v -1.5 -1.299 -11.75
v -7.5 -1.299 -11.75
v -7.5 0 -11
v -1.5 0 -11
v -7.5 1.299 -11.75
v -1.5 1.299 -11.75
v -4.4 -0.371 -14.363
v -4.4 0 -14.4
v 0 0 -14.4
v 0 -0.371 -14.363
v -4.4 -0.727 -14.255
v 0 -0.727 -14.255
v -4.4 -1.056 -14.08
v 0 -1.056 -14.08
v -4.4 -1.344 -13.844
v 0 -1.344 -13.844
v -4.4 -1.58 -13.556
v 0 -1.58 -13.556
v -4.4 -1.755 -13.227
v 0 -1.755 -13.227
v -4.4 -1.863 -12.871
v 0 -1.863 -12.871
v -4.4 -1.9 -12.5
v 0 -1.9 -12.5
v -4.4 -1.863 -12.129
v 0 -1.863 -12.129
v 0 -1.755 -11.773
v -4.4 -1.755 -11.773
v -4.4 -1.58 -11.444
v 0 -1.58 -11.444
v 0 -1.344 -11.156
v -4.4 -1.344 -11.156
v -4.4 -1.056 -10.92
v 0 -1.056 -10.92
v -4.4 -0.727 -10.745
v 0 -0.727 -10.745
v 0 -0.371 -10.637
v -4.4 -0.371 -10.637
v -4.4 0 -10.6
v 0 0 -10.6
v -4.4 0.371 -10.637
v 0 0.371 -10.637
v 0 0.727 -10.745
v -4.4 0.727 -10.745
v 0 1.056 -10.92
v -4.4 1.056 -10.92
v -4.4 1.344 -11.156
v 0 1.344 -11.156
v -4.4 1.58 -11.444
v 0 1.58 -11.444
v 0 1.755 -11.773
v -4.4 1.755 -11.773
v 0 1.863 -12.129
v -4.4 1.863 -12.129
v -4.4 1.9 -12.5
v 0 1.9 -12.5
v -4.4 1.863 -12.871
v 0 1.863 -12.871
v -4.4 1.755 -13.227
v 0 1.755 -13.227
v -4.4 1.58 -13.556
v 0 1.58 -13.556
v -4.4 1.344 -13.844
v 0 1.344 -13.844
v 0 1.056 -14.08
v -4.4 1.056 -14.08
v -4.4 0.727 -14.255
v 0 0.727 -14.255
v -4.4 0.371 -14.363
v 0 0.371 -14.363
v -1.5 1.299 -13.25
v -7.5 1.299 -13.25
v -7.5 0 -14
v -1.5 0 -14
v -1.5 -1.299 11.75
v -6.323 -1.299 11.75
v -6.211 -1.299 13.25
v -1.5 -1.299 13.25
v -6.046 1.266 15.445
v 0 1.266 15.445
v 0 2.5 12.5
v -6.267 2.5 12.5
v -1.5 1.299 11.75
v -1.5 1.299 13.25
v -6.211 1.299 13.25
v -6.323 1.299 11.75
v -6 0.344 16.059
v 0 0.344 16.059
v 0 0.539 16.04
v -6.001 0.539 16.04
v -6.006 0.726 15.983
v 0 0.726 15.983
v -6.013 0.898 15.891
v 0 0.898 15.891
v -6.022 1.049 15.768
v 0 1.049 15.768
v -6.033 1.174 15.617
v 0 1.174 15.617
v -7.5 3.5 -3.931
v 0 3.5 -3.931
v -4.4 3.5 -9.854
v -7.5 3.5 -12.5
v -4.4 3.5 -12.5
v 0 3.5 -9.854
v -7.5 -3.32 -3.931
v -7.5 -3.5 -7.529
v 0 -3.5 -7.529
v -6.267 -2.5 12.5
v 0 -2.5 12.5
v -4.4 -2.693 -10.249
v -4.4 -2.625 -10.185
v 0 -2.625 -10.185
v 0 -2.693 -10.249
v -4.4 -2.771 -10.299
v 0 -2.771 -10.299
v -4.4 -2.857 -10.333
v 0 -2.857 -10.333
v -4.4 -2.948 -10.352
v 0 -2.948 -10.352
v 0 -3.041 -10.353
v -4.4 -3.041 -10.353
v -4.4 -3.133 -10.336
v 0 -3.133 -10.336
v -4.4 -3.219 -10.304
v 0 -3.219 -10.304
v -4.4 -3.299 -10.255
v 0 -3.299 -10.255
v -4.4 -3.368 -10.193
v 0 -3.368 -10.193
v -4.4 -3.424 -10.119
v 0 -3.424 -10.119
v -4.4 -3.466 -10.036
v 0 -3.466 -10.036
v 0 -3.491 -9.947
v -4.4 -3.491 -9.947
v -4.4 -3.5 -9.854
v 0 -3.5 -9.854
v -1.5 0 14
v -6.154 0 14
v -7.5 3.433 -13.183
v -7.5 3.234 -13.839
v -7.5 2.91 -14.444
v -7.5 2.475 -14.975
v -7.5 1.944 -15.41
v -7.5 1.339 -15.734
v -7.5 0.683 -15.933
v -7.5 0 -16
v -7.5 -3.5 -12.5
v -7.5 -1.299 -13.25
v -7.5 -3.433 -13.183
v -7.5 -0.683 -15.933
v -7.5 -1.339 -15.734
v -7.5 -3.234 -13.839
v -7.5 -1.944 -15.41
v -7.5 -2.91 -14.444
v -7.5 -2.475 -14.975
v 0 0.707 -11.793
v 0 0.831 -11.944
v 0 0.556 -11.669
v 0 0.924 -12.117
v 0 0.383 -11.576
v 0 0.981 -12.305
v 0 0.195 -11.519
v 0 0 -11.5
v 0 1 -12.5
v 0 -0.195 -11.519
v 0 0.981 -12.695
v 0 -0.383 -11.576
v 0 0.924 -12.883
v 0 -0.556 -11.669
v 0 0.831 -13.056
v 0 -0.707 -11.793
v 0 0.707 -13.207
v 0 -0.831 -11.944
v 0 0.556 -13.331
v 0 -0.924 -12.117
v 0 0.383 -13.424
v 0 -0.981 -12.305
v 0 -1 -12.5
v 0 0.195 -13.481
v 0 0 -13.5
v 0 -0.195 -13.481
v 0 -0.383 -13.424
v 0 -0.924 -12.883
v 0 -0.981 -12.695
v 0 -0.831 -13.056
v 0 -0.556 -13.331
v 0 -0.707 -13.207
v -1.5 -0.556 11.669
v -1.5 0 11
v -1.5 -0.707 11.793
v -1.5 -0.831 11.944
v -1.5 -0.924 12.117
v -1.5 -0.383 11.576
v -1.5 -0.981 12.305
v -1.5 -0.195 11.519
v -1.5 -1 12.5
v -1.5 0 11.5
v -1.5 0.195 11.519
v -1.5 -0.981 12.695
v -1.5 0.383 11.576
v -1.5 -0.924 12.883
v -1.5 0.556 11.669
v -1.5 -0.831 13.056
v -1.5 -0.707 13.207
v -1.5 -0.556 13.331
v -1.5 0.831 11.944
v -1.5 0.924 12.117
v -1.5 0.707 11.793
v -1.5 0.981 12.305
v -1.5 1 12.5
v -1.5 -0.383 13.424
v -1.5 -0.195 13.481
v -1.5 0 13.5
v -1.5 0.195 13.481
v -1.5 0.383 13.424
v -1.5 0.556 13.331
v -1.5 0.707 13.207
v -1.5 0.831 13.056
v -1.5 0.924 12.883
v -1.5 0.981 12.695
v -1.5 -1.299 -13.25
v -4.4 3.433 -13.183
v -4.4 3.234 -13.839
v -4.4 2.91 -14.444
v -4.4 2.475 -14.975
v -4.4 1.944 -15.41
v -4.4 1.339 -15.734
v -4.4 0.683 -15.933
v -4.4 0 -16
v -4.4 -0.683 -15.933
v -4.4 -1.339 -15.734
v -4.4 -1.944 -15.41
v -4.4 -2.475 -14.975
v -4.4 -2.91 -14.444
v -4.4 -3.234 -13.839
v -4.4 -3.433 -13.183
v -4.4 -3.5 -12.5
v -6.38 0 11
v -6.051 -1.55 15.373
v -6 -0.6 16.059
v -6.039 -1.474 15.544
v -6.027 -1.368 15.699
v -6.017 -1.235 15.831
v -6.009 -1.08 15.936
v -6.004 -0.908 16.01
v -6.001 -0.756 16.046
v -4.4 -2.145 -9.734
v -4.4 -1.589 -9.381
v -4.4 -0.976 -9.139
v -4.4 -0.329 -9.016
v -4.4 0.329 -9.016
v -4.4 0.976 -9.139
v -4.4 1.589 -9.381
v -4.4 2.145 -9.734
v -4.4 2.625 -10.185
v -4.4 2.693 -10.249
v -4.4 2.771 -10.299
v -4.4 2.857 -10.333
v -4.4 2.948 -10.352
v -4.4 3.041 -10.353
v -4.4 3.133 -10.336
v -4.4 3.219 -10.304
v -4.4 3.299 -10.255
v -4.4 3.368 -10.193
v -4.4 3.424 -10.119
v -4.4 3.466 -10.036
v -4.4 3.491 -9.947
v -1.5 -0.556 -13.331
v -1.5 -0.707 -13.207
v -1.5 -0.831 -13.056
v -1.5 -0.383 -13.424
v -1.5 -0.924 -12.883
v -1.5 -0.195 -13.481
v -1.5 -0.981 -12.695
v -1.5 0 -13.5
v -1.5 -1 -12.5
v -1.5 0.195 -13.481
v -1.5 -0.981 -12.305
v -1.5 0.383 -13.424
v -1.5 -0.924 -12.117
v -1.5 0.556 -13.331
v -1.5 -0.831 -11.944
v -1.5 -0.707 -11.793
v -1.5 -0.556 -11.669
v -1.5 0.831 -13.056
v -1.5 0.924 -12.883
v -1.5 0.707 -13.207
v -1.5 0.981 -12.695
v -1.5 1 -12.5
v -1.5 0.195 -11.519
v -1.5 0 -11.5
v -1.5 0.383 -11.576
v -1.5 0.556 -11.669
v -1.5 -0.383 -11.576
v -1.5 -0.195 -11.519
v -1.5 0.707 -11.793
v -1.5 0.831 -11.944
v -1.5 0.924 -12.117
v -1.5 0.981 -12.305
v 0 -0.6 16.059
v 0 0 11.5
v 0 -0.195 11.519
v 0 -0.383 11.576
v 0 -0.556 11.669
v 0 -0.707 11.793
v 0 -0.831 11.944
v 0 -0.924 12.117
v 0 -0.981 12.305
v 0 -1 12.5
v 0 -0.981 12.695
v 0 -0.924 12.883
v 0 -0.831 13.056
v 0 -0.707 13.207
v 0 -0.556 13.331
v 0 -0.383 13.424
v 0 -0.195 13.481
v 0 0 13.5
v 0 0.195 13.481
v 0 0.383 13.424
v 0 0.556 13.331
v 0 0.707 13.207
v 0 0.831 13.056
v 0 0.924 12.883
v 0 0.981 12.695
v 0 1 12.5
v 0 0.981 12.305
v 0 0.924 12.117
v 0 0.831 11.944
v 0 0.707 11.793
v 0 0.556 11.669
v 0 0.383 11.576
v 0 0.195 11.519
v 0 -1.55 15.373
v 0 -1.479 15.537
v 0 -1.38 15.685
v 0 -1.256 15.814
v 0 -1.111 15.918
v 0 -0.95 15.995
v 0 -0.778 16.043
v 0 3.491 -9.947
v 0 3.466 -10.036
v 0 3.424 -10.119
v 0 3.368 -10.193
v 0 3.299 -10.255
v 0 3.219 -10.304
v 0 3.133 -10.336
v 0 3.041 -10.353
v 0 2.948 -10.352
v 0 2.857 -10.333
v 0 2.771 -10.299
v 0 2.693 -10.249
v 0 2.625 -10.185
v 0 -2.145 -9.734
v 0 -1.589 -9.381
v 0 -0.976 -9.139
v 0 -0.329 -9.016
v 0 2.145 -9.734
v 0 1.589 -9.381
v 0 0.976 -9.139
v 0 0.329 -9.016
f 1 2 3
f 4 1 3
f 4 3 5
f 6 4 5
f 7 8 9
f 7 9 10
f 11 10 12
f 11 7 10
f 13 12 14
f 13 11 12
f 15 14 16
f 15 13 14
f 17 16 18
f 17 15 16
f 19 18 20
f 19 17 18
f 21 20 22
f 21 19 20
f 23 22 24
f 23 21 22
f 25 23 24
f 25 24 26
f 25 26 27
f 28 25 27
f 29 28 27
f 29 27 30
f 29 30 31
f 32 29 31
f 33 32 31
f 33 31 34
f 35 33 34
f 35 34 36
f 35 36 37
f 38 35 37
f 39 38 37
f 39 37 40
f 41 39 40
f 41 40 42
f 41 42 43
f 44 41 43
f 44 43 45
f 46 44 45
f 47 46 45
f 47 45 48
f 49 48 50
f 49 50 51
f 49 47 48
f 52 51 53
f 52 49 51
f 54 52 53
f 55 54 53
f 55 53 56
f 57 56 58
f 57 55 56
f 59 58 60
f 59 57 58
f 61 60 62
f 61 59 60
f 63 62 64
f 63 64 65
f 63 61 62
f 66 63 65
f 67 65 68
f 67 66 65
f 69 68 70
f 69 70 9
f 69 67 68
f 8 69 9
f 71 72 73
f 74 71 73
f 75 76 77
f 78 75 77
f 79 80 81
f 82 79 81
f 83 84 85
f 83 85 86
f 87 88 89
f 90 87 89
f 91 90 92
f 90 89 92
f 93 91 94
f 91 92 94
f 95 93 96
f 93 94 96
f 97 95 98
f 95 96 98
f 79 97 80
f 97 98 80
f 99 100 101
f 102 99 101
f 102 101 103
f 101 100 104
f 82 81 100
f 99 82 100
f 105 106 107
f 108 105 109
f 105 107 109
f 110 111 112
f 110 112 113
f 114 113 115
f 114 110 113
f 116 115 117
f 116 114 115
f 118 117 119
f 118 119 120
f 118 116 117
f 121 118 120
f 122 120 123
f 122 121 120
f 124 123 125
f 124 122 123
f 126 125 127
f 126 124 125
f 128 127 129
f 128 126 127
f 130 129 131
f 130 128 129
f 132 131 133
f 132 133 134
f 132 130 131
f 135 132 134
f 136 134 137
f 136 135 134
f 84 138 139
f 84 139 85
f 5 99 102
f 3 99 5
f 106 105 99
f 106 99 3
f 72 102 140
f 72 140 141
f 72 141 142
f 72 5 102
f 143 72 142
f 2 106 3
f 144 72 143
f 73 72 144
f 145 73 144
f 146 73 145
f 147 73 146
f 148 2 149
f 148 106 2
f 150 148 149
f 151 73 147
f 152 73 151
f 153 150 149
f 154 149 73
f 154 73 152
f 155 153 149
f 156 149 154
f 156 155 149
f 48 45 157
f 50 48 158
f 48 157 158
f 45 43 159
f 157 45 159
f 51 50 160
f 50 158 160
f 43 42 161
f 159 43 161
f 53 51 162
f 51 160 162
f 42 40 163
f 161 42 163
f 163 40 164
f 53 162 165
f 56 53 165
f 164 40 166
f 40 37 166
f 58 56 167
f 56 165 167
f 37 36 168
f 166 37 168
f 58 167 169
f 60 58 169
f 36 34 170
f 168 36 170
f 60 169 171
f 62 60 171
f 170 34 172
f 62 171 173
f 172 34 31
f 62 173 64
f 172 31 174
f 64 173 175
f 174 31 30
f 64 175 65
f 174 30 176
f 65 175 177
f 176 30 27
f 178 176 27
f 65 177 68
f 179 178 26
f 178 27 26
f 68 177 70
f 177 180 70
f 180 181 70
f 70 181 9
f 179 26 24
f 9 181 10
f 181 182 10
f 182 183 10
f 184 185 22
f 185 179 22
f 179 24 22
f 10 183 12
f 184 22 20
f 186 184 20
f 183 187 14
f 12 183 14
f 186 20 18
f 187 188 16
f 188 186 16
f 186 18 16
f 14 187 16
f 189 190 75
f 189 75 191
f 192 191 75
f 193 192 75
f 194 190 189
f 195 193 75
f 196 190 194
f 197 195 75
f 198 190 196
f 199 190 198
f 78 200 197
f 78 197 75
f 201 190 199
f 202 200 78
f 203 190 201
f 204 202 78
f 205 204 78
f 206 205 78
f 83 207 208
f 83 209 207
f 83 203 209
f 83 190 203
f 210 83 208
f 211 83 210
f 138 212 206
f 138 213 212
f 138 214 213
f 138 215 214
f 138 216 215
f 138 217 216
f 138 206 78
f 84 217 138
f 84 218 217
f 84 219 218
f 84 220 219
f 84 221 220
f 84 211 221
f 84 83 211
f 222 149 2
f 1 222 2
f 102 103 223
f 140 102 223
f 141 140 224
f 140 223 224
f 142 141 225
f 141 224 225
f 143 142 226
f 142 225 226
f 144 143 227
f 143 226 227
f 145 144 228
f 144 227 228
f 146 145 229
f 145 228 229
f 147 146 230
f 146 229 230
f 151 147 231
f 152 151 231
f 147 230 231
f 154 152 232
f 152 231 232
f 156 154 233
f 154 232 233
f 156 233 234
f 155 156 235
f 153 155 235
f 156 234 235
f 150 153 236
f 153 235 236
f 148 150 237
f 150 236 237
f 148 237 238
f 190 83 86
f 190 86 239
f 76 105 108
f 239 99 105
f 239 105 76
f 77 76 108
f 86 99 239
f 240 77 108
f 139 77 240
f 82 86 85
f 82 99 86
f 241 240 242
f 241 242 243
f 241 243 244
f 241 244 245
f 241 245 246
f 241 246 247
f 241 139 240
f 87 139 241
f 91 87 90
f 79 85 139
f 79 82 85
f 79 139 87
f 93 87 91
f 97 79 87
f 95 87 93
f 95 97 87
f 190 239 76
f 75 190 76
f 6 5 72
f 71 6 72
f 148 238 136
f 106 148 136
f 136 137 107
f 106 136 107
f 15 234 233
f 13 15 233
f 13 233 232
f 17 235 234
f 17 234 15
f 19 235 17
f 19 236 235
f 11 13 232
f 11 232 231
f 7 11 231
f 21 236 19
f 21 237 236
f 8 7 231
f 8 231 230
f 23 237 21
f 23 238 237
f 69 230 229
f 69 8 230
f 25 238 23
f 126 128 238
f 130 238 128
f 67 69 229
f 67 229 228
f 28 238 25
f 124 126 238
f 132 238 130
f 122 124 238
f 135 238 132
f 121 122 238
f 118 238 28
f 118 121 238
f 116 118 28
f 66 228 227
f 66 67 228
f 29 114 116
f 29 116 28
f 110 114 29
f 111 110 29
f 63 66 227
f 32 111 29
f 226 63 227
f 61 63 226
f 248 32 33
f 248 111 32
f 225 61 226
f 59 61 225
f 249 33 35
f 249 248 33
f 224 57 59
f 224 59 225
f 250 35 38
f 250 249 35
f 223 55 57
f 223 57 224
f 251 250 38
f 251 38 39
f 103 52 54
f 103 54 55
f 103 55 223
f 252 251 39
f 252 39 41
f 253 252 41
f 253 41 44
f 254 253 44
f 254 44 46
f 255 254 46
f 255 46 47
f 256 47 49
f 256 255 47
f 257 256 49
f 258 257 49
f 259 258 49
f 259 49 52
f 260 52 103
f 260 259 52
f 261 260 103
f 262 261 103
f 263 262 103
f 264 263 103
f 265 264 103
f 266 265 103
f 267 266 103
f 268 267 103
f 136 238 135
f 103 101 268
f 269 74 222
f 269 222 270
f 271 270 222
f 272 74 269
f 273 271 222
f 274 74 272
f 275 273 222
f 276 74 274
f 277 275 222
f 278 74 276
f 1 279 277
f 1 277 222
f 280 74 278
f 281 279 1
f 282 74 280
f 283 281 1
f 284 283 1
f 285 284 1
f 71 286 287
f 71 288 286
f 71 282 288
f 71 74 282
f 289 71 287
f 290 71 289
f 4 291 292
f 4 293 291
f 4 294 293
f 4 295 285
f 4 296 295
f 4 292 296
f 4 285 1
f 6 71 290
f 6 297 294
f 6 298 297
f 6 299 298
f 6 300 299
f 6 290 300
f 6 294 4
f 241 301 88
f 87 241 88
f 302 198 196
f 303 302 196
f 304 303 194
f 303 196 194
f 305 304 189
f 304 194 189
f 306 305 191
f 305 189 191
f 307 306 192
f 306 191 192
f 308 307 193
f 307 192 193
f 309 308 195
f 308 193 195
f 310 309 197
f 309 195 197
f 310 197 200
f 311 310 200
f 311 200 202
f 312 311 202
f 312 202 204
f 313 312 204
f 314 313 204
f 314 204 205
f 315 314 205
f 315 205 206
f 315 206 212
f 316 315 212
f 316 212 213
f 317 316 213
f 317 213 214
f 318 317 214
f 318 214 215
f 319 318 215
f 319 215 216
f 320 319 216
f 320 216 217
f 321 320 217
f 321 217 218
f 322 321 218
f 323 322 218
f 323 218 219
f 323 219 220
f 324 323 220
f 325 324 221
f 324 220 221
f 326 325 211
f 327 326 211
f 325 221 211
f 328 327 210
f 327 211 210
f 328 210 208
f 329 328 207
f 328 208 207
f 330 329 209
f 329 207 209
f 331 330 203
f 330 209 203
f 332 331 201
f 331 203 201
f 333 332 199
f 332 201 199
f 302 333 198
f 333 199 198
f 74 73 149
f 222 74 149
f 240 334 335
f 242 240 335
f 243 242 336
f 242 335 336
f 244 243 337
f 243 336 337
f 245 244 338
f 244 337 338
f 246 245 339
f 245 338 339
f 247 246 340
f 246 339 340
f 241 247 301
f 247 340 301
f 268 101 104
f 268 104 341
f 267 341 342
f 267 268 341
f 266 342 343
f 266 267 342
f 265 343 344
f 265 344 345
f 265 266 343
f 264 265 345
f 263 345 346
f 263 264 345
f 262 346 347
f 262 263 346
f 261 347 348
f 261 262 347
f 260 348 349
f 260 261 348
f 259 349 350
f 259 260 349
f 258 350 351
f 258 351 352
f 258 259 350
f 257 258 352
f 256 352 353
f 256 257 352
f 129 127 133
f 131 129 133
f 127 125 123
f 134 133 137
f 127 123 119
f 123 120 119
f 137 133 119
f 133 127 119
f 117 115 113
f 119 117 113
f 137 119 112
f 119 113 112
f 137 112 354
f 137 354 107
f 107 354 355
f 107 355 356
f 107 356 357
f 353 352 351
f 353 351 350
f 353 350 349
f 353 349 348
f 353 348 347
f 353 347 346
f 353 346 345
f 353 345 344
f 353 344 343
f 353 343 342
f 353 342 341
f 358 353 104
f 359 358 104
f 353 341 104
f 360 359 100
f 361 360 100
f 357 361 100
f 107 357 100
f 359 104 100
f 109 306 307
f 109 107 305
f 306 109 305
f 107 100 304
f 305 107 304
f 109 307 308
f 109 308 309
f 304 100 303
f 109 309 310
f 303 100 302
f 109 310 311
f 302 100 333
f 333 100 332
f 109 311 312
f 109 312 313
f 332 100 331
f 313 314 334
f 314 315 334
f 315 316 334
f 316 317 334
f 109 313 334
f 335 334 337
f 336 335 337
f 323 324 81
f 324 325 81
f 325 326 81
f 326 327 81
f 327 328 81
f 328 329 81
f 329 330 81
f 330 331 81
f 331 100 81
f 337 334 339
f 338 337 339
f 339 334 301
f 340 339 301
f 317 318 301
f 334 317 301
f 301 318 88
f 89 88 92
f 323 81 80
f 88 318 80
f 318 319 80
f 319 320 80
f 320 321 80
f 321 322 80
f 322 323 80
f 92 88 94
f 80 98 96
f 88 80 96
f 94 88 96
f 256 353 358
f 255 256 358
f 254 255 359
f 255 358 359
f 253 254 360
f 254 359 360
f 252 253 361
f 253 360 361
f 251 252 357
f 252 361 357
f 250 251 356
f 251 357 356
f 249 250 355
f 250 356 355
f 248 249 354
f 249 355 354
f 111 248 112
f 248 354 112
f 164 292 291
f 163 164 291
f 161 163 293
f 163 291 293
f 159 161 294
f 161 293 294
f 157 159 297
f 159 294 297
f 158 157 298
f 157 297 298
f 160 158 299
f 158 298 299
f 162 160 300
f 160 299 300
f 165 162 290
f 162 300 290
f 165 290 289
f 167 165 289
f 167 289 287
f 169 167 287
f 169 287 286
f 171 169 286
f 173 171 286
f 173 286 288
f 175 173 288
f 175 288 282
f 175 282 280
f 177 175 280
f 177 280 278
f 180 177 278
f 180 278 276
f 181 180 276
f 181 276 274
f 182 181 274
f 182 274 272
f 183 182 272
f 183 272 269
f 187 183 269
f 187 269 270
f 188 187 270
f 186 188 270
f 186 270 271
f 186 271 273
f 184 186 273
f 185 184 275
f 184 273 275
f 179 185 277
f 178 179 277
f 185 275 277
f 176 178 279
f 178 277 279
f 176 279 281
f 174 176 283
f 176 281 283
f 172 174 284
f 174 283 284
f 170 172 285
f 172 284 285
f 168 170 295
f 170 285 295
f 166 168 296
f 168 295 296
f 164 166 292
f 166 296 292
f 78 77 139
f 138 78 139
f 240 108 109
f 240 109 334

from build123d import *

# Parameters (mm, degrees)
BOSS_EXTRUDE1_DEPTH = 7.5
SKETCH2_R           = 3.5
CUT_EXTRUDE1_DEPTH  = 4.4
FILLET1_START       = -4.4
FILLET1_DEPTH       = 5.4
SKETCH3_R           = 1.9
BOSS_EXTRUDE2_DEPTH = 7.5
CUT_EXTRUDE2_REACH  = 21.056
SKETCH7_R           = 1
CUT_EXTRUDE3_DEPTH  = 7.5
CUT_EXTRUDE4_DEPTH  = 6


with BuildPart() as part:
    # Sketch1 → Boss-Extrude1 (new body)
    with BuildSketch(Plane(origin=(0, 0, 0), x_dir=(0, 0, -1), z_dir=(1, 0, 0))):
        with BuildLine():
            Line((12.5, -3.5), (7.528802268, -3.5))
            Line((7.528802268, -3.5), (-12.5, -2.5))
            Line((-12.5, -2.5), (-15.372715308, -1.549625261))
            ThreePointArc((-15.372715308, -1.549625261), (-15.869210997, -1.185856004), (-16.058629018, -0.600230821))
            Line((-16.058629018, -0.600230821), (-16.058629018, 0.344074306))
            ThreePointArc((-16.058629018, 0.344074306), (-15.891200042, 0.897992613), (-15.444978036, 1.26642697))
            Line((-15.444978036, 1.26642697), (-12.5, 2.5))
            Line((-12.5, 2.5), (3.930719529, 3.5))
            Line((3.930719529, 3.5), (12.5, 3.5))
            ThreePointArc((12.5, 3.5), (16, 0), (12.5, -3.5))
        make_face()
    extrude(amount=-BOSS_EXTRUDE1_DEPTH)

    # Sketch2 → Cut-Extrude1 (cut)
    with BuildSketch(Plane(origin=(0, 0, 0), x_dir=(0, 0, -1), z_dir=(1, 0, 0))):
        with Locations((12.5, 0)):
            Circle(SKETCH2_R)
    extrude(amount=-CUT_EXTRUDE1_DEPTH, mode=Mode.SUBTRACT)

    # Fillet1: read off the stored shape, not the designer's step
    # Fillet1 outline → Fillet1 (cut)
    with BuildSketch(Plane.YZ.offset(FILLET1_START)):
        with BuildLine():
            ThreePointArc((3.5, -9.854248689), (3.176776695, -10.321955862), (2.625, -10.184967603))
            ThreePointArc((2.625, -10.184967603), (3.273950213, -11.262563133), (3.5, -12.5))
            Line((3.5, -12.5), (3.5, -9.854248689))
        make_face()
        with BuildLine():
            ThreePointArc((-2.625, -10.184967603), (-3.176776695, -10.321955862), (-3.5, -9.854248689))
            Line((-3.5, -9.854248689), (-3.5, -12.5))
            ThreePointArc((-3.5, -12.5), (-3.273950213, -11.262563133), (-2.625, -10.184967603))
        make_face()
    extrude(amount=FILLET1_DEPTH, mode=Mode.SUBTRACT)

    # Sketch3 → Boss-Extrude2 (add)
    with BuildSketch(Plane.ZY.offset(7.5)):
        with Locations(Location((-12.5, 0, 0), (0, 0, 180))):
            Circle(SKETCH3_R)
    extrude(amount=-BOSS_EXTRUDE2_DEPTH)

    # Cut-Extrude2: up to this plane
    cut_extrude2_end = Plane(origin=(-7.5, -3.116332783, 0.155592568), z_dir=(0, 0.9987559179882337, -0.04986598322986022))
    # Sketch4 → Cut-Extrude2 (cut, up to the surface)
    with BuildSketch(Plane(origin=(0, 3.5, 0), x_dir=(1, 0, 0), z_dir=(0, 1, 0)), mode=Mode.PRIVATE) as cut_extrude2_sk1:
        Polygon((-7.5, -16.058629018), (-7.5, 3.930719529), (-6, -16.058629018), align=None)
    cut_extrude2_tool1 = split(extrude(cut_extrude2_sk1.sketch, amount=-CUT_EXTRUDE2_REACH, mode=Mode.PRIVATE), bisect_by=cut_extrude2_end, keep=Keep.BOTH, mode=Mode.PRIVATE)
    add(cut_extrude2_tool1.solids().sort_by_distance((-7, 3.5, 9.395513))[0], mode=Mode.SUBTRACT)

    # Sketch7 → Cut-Extrude3 (cut)
    with BuildSketch(Plane.ZY.offset(7.5)):
        with Locations((-12.5, 0)):
            Circle(SKETCH7_R)
        with Locations(Location((12.5, 0, 0), (0, 0, 180))):
            Circle(SKETCH7_R)
    extrude(amount=-CUT_EXTRUDE3_DEPTH, mode=Mode.SUBTRACT)

    # Sketch8 → Cut-Extrude4 (cut)
    with BuildSketch(Plane.ZY.offset(7.5)):
        Polygon((-11, 0), (-11.75, 1.299038106), (-13.25, 1.299038106), (-14, 0), (-13.25, -1.299038106), (-11.75, -1.299038106), align=None)
        Polygon((14, 0), (13.25, 1.299038106), (11.75, 1.299038106), (11, 0), (11.75, -1.299038106), (13.25, -1.299038106), align=None)
    extrude(amount=-CUT_EXTRUDE4_DEPTH, mode=Mode.SUBTRACT)


solid = part.part
